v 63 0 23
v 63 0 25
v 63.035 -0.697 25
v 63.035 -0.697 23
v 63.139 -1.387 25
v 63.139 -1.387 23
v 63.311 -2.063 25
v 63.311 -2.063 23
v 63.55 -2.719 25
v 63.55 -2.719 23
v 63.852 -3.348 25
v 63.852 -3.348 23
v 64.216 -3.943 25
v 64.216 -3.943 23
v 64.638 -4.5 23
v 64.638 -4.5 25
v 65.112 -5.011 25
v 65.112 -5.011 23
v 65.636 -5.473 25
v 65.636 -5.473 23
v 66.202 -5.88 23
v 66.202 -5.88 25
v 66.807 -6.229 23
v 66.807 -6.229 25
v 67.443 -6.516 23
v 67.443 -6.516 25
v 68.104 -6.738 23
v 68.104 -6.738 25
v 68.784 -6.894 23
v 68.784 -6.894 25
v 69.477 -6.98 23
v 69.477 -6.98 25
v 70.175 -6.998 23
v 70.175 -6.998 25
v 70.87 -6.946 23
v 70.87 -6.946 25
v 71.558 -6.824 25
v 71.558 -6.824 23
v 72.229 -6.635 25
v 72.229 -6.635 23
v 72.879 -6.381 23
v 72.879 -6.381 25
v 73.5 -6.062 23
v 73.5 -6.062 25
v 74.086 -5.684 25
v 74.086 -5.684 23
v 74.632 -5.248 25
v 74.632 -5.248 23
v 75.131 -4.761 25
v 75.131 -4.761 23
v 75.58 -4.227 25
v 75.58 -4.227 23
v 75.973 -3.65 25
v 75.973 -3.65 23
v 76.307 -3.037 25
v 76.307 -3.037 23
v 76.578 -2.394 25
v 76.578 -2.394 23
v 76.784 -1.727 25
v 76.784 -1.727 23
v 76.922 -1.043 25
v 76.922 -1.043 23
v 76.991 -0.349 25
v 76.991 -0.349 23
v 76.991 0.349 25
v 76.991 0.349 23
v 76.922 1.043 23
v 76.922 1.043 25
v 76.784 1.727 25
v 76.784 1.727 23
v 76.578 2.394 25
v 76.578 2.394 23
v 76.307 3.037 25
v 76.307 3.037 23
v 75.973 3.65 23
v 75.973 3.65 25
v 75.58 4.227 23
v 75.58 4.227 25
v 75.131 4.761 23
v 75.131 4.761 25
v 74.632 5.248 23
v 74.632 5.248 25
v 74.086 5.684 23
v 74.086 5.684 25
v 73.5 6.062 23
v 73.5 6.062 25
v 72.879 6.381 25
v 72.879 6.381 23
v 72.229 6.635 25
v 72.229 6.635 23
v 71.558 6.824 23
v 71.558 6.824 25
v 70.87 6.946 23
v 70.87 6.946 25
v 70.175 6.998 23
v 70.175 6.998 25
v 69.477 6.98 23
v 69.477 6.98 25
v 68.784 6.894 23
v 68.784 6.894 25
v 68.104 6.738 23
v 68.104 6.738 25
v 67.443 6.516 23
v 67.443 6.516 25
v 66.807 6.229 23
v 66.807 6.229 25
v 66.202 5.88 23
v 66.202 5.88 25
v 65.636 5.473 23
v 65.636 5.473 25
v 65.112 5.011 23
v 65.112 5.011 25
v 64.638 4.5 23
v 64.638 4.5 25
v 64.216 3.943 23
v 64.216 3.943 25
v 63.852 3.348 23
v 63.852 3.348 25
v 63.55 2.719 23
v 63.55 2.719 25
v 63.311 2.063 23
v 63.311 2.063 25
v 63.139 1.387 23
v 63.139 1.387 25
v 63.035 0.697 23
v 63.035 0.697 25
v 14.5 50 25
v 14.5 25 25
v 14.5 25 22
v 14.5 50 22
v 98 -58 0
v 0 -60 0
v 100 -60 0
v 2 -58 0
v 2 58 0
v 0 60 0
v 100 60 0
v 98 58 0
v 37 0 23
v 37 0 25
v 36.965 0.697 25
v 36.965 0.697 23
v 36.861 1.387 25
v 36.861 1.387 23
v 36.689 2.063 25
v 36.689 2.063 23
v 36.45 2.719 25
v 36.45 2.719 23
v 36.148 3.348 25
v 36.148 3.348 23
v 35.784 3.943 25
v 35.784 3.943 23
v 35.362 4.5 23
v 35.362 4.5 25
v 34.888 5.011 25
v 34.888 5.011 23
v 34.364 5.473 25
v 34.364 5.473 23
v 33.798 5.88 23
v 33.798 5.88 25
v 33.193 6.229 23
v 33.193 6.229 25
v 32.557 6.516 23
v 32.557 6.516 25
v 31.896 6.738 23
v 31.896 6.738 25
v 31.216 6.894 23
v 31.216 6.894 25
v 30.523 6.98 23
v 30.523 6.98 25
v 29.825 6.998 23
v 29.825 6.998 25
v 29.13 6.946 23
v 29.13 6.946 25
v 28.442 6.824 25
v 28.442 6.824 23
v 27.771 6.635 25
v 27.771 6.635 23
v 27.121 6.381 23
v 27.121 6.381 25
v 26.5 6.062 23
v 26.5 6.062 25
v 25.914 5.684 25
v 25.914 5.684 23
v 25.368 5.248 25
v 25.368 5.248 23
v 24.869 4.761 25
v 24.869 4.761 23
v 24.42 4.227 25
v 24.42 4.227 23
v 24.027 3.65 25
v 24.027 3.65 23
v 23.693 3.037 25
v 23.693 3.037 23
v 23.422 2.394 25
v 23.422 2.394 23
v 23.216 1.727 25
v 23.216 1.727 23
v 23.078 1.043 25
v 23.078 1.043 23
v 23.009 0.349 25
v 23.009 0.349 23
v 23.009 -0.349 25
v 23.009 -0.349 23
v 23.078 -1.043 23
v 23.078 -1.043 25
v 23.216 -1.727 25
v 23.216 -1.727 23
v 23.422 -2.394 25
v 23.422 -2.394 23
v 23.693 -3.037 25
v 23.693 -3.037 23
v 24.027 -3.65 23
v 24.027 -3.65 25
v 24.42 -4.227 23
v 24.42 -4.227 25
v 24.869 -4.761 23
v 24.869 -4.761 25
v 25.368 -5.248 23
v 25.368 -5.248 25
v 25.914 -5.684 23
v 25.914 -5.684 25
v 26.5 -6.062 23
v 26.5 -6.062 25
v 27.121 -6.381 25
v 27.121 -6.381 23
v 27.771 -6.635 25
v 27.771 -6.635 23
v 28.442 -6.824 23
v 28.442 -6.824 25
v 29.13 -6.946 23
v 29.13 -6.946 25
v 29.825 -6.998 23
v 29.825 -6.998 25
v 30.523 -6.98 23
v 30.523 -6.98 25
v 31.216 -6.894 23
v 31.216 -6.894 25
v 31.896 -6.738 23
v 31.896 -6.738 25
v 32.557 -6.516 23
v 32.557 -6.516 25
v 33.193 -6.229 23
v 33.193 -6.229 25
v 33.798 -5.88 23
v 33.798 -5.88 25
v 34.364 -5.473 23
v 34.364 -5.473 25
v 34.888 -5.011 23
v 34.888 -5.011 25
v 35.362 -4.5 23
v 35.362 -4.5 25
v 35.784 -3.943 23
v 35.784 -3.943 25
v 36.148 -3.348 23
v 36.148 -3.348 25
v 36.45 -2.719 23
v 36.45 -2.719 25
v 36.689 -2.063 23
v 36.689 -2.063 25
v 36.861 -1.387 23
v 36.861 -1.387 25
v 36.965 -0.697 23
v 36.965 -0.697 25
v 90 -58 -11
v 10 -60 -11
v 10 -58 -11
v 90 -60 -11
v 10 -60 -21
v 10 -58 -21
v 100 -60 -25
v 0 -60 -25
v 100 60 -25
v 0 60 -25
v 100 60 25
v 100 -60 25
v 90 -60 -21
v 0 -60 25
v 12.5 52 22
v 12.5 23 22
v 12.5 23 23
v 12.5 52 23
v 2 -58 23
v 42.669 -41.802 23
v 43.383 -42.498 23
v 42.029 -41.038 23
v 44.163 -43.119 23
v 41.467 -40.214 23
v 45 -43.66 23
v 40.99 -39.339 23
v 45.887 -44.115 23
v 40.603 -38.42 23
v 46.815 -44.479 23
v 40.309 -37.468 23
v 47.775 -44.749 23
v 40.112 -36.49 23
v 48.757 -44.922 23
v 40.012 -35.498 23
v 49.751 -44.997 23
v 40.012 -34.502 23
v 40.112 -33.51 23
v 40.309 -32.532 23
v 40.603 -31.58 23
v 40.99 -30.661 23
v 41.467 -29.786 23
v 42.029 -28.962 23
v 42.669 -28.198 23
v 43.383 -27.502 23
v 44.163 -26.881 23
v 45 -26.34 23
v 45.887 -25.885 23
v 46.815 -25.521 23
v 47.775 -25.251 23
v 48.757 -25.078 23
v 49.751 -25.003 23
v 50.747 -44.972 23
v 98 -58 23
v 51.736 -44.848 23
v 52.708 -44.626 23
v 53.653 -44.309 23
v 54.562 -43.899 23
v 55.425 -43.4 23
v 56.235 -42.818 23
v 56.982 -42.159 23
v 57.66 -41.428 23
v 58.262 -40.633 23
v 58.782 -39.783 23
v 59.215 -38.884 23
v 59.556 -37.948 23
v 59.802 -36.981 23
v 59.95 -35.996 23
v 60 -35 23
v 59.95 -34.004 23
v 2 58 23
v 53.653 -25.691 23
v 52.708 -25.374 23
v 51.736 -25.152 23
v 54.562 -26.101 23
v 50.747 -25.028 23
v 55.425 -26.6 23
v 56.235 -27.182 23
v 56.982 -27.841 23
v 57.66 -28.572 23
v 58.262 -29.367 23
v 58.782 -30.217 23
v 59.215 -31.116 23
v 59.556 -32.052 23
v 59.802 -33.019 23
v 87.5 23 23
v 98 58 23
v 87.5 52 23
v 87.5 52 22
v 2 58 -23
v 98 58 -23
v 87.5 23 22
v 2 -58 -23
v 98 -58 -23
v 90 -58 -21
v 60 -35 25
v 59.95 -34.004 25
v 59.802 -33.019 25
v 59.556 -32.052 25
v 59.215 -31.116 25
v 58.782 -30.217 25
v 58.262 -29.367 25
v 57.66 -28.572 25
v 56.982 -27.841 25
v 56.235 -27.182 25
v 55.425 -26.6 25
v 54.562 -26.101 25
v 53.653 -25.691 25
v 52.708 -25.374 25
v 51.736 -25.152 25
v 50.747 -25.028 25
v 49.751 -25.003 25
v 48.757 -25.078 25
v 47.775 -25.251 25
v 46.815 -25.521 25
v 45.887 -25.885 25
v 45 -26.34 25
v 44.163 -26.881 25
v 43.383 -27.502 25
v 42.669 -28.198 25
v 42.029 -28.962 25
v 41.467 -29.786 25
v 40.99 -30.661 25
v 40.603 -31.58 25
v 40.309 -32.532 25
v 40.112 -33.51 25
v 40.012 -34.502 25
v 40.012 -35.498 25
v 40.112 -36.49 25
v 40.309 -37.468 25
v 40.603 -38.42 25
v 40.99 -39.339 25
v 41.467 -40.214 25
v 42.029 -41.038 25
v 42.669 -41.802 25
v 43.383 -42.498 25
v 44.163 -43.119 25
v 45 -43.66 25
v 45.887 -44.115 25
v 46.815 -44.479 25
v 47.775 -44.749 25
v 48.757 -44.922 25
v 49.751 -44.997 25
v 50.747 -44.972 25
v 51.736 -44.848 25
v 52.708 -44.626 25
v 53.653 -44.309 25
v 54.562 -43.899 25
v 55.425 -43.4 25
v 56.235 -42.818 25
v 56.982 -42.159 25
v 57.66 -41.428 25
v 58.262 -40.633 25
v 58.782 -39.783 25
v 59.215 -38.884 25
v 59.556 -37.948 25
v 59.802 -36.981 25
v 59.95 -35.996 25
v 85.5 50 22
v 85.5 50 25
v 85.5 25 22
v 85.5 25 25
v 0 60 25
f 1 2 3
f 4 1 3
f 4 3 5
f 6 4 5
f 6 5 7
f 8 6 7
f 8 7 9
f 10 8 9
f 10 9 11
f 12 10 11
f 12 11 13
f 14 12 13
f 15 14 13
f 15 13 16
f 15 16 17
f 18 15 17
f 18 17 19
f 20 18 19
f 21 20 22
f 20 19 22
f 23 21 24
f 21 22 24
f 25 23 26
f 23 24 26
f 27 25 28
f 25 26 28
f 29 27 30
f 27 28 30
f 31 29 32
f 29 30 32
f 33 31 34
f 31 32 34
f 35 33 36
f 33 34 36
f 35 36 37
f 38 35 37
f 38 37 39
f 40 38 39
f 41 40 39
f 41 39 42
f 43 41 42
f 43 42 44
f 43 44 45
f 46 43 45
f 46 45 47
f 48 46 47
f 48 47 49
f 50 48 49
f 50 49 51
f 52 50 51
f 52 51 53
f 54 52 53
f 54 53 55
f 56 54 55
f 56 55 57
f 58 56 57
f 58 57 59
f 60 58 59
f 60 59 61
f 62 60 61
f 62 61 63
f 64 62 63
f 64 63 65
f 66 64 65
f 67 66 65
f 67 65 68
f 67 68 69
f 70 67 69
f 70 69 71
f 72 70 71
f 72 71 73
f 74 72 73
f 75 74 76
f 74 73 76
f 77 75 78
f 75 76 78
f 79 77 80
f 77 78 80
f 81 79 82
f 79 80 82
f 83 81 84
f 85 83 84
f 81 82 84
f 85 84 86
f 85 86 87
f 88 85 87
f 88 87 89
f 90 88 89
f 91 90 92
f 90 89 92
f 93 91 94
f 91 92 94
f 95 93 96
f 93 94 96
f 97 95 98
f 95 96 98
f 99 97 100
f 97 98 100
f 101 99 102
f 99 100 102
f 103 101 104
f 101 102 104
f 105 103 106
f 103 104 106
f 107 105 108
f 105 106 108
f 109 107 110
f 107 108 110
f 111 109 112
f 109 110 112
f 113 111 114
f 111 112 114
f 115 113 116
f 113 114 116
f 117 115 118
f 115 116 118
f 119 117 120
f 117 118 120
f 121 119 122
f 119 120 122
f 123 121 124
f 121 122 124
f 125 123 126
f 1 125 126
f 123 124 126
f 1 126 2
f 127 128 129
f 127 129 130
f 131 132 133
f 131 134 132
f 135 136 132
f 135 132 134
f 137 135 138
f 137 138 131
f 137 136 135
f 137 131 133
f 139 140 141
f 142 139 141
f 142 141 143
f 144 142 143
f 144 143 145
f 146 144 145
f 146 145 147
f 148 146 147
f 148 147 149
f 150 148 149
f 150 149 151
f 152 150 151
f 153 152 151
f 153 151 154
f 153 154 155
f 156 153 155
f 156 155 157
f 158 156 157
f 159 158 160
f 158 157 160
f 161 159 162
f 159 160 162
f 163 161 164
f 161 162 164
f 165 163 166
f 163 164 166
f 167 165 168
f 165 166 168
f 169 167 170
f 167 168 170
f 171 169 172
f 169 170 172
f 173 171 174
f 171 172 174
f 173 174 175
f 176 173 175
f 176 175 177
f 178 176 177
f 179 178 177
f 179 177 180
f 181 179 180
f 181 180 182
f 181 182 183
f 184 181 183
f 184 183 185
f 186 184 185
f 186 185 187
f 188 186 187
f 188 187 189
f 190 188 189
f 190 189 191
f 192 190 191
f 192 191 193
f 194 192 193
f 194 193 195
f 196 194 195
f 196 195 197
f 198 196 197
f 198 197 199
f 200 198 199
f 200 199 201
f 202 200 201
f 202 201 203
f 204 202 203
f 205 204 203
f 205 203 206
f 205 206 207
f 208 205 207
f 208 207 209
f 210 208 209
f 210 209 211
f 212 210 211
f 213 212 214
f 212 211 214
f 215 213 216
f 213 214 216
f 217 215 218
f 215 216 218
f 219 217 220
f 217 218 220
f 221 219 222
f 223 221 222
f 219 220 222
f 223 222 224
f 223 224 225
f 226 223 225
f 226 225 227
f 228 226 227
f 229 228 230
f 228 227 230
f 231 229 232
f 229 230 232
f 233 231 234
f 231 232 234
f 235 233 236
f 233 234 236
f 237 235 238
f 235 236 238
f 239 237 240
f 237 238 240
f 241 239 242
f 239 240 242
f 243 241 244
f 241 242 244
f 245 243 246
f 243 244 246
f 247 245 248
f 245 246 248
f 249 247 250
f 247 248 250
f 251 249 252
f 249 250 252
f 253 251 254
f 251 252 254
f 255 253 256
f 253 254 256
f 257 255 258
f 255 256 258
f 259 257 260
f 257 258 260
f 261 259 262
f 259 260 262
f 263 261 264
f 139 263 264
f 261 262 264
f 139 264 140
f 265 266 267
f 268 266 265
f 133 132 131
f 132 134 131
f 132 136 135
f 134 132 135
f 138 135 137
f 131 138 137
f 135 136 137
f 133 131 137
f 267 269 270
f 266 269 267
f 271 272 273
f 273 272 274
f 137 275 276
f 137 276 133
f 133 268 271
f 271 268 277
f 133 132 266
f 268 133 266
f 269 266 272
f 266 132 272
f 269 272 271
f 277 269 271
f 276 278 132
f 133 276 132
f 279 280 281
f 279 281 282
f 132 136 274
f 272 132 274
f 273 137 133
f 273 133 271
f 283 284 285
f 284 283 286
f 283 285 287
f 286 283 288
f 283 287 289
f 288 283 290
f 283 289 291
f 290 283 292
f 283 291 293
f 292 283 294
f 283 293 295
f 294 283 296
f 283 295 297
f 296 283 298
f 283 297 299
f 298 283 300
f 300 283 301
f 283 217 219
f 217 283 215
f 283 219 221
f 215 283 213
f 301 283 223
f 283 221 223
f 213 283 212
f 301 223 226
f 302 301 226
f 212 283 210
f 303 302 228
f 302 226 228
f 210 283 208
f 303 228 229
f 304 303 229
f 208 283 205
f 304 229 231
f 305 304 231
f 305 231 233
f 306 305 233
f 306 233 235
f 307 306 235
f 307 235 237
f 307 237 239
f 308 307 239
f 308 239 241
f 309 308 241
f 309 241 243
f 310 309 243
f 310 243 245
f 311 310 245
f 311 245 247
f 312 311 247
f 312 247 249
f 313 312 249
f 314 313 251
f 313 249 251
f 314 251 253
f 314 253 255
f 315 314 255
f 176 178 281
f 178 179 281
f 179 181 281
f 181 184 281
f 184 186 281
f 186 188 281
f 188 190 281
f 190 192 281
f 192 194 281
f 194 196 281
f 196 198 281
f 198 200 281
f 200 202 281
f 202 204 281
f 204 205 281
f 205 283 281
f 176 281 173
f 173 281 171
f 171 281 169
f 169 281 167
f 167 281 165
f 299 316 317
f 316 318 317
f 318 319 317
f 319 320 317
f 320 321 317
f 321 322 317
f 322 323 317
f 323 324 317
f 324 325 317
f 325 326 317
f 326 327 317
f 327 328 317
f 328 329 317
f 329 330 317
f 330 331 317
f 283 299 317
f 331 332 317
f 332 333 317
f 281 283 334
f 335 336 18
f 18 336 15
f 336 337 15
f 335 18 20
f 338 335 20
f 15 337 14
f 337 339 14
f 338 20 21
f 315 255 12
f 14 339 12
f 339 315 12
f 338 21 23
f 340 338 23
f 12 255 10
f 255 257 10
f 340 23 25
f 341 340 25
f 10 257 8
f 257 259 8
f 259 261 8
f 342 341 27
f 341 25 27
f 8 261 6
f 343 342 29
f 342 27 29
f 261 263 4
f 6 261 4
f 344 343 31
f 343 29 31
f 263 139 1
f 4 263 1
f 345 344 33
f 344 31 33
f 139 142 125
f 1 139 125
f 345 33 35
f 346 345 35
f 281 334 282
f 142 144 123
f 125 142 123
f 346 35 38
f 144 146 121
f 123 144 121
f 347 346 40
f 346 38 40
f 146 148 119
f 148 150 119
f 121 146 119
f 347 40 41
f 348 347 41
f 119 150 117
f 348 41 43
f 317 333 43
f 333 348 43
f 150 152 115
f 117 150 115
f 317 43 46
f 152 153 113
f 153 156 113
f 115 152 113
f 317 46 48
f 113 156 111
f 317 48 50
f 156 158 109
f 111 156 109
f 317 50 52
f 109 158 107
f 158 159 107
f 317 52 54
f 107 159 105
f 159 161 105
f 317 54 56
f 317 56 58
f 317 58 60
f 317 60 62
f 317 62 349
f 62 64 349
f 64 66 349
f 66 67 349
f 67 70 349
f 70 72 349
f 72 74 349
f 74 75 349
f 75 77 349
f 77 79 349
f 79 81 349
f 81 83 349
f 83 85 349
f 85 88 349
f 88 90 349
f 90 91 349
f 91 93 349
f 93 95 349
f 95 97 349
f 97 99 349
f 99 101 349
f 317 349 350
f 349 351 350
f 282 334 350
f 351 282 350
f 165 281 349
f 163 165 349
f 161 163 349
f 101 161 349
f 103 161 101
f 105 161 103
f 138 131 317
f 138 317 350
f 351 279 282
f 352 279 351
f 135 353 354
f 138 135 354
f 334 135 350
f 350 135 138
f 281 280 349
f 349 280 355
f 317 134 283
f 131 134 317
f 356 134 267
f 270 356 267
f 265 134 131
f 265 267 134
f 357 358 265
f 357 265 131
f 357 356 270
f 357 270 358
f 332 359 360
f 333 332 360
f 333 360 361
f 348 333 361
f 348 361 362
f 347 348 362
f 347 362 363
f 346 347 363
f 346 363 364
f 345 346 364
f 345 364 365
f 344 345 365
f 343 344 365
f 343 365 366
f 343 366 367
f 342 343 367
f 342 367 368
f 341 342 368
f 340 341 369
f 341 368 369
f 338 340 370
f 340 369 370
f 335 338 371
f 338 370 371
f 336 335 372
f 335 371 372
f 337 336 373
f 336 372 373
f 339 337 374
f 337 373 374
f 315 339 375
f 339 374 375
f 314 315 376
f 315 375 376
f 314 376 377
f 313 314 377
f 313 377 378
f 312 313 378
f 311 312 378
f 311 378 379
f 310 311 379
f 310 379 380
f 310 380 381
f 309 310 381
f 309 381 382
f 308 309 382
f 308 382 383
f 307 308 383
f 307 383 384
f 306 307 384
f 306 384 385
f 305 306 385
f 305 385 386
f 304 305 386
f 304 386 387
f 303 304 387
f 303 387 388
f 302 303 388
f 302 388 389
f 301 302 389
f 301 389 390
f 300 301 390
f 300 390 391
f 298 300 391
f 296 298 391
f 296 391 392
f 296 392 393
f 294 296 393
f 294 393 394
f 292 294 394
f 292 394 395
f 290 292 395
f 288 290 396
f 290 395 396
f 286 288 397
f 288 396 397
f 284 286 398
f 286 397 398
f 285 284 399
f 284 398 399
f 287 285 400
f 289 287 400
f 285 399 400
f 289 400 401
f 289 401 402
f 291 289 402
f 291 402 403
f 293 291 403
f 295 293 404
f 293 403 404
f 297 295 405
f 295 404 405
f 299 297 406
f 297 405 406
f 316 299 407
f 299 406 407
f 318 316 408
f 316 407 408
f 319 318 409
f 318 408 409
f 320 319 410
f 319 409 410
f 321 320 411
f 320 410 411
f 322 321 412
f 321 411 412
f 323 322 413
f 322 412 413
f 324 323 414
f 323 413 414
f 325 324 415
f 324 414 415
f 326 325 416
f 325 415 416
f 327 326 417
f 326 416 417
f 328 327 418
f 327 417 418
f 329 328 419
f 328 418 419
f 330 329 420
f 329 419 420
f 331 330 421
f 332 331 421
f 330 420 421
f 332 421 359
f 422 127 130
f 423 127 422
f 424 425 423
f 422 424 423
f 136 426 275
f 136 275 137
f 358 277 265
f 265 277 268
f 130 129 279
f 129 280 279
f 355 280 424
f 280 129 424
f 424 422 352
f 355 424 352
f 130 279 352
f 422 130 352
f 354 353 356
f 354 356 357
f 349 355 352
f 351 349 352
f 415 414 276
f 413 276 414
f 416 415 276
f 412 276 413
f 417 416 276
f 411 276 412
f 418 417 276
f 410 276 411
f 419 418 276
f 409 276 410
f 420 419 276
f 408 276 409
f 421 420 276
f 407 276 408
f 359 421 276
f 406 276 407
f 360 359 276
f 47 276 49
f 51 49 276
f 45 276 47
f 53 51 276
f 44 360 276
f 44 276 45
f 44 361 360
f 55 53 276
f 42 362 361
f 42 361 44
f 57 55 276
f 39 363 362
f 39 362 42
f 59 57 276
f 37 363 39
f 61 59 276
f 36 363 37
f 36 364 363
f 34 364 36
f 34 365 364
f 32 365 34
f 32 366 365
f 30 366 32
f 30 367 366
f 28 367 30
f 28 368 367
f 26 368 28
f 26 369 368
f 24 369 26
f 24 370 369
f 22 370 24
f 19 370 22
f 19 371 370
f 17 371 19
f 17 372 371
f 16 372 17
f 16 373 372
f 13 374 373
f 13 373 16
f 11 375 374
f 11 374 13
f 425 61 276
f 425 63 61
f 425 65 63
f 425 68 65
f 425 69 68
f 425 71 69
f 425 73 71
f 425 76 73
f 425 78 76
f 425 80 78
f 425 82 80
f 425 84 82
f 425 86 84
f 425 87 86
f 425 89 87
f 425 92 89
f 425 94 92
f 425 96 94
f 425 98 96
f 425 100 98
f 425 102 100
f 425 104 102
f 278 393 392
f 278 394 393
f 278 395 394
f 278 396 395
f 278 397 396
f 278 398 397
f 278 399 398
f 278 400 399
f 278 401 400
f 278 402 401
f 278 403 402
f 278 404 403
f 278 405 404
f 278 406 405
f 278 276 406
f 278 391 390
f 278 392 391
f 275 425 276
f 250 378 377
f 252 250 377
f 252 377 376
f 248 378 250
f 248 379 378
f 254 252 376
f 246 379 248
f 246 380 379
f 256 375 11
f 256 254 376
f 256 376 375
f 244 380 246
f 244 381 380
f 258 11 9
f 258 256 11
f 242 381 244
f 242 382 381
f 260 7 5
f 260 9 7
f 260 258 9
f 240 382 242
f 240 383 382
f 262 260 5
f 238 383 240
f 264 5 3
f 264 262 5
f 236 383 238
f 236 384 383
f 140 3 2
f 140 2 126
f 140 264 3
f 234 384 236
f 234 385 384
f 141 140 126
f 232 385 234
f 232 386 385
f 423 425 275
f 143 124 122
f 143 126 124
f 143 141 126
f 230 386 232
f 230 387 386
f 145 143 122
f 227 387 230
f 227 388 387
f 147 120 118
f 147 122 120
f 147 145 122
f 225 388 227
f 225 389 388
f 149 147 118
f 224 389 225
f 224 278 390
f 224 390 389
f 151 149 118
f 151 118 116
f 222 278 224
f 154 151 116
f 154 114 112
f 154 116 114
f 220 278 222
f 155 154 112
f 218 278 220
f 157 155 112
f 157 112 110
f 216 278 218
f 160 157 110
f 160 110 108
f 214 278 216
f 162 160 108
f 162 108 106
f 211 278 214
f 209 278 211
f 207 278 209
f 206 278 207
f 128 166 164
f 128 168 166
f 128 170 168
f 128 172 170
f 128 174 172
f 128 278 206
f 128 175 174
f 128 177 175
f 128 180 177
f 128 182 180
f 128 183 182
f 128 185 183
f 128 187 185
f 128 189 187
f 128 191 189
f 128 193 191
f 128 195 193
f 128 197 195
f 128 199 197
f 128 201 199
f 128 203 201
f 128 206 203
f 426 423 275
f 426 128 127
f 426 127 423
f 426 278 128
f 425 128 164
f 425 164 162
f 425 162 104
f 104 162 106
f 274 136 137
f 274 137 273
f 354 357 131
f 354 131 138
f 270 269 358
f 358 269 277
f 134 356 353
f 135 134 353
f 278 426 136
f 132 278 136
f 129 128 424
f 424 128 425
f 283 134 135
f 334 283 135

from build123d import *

# Parameters (mm, degrees)
SKETCH1_W            = 50
SKETCH1_H            = 120
BOSS_EXTRUDE1_DEPTH  = 100
SKETCH2_W            = 71
SKETCH2_H            = 25
CUT_EXTRUDE1_DEPTH   = 3
SHELL1_START         = -23
SHELL1_OUTLINE_W     = 96
SHELL1_OUTLINE_H     = 116
SHELL1_DEPTH         = 45
SHELL1_START_2       = 22
SHELL1_2_OUTLINE_W   = 96
SHELL1_2_OUTLINE_H   = 116
SHELL1_2_OUTLINE_W_2 = 75
SHELL1_2_OUTLINE_H_2 = 29
SHELL1_2_DEPTH       = 1
SKETCH3_W            = 80
SKETCH3_H            = 10
CUT_EXTRUDE2_DEPTH   = 3
SKETCH4_R            = 10
CUT_EXTRUDE3_DEPTH   = 3
SKETCH5_R            = 7
CUT_EXTRUDE4_DEPTH   = 3


# Read off the part's stored shape, not the designer's step: Shell1
with BuildPart() as part:
    # Sketch1 → Boss-Extrude1 (new body)
    with BuildSketch(Plane(origin=(0, 0, 0), x_dir=(0, 0, -1), z_dir=(1, 0, 0))):
        Rectangle(SKETCH1_W, SKETCH1_H)
    extrude(amount=BOSS_EXTRUDE1_DEPTH)

    # Sketch2 → Cut-Extrude1 (cut)
    with BuildSketch(Plane.XY.offset(25)):
        with Locations((50, 37.5)):
            Rectangle(SKETCH2_W, SKETCH2_H)
    extrude(amount=-CUT_EXTRUDE1_DEPTH, mode=Mode.SUBTRACT)

    # Shell1 outline → Shell1 (cut)
    with BuildSketch(Plane.XY.offset(SHELL1_START)):
        with Locations((50, 0)):
            Rectangle(SHELL1_OUTLINE_W, SHELL1_OUTLINE_H)
    extrude(amount=SHELL1_DEPTH, mode=Mode.SUBTRACT)

    # Shell1 2 outline → Shell1 2 (cut)
    with BuildSketch(Plane.XY.offset(SHELL1_START_2)):
        with Locations((50, 0)):
            Rectangle(SHELL1_2_OUTLINE_W, SHELL1_2_OUTLINE_H)
        with Locations((50, 37.5)):
            Rectangle(SHELL1_2_OUTLINE_W_2, SHELL1_2_OUTLINE_H_2, mode=Mode.SUBTRACT)
    extrude(amount=SHELL1_2_DEPTH, mode=Mode.SUBTRACT)

    # Sketch3 → Cut-Extrude2 (cut)
    with BuildSketch(Plane.XZ.offset(60)):
        with Locations((50, -16)):
            Rectangle(SKETCH3_W, SKETCH3_H)
    extrude(amount=-CUT_EXTRUDE2_DEPTH, mode=Mode.SUBTRACT)

    # Sketch4 → Cut-Extrude3 (cut)
    with BuildSketch(Plane.XY.offset(25)):
        with Locations((50, -35)):
            Circle(SKETCH4_R)
    extrude(amount=-CUT_EXTRUDE3_DEPTH, mode=Mode.SUBTRACT)

    # Sketch5 → Cut-Extrude4 (cut)
    with BuildSketch(Plane.XY.offset(25)):
        with Locations((30, 0)):
            Circle(SKETCH5_R)
        with Locations(Location((70, 0, 0), (0, 0, 180))):
            Circle(SKETCH5_R)
    extrude(amount=-CUT_EXTRUDE4_DEPTH, mode=Mode.SUBTRACT)


with BuildPart() as body_2:
    # Split1: the piece on the far side of the plane
    add(part.part)
    split(bisect_by=Plane.XY, keep=Keep.BOTTOM)


with BuildPart() as part_1:
    add(part.part)

    # Split1
    split(bisect_by=Plane.XY, keep=Keep.TOP)


solid = Compound([body_2.part, part_1.part])
